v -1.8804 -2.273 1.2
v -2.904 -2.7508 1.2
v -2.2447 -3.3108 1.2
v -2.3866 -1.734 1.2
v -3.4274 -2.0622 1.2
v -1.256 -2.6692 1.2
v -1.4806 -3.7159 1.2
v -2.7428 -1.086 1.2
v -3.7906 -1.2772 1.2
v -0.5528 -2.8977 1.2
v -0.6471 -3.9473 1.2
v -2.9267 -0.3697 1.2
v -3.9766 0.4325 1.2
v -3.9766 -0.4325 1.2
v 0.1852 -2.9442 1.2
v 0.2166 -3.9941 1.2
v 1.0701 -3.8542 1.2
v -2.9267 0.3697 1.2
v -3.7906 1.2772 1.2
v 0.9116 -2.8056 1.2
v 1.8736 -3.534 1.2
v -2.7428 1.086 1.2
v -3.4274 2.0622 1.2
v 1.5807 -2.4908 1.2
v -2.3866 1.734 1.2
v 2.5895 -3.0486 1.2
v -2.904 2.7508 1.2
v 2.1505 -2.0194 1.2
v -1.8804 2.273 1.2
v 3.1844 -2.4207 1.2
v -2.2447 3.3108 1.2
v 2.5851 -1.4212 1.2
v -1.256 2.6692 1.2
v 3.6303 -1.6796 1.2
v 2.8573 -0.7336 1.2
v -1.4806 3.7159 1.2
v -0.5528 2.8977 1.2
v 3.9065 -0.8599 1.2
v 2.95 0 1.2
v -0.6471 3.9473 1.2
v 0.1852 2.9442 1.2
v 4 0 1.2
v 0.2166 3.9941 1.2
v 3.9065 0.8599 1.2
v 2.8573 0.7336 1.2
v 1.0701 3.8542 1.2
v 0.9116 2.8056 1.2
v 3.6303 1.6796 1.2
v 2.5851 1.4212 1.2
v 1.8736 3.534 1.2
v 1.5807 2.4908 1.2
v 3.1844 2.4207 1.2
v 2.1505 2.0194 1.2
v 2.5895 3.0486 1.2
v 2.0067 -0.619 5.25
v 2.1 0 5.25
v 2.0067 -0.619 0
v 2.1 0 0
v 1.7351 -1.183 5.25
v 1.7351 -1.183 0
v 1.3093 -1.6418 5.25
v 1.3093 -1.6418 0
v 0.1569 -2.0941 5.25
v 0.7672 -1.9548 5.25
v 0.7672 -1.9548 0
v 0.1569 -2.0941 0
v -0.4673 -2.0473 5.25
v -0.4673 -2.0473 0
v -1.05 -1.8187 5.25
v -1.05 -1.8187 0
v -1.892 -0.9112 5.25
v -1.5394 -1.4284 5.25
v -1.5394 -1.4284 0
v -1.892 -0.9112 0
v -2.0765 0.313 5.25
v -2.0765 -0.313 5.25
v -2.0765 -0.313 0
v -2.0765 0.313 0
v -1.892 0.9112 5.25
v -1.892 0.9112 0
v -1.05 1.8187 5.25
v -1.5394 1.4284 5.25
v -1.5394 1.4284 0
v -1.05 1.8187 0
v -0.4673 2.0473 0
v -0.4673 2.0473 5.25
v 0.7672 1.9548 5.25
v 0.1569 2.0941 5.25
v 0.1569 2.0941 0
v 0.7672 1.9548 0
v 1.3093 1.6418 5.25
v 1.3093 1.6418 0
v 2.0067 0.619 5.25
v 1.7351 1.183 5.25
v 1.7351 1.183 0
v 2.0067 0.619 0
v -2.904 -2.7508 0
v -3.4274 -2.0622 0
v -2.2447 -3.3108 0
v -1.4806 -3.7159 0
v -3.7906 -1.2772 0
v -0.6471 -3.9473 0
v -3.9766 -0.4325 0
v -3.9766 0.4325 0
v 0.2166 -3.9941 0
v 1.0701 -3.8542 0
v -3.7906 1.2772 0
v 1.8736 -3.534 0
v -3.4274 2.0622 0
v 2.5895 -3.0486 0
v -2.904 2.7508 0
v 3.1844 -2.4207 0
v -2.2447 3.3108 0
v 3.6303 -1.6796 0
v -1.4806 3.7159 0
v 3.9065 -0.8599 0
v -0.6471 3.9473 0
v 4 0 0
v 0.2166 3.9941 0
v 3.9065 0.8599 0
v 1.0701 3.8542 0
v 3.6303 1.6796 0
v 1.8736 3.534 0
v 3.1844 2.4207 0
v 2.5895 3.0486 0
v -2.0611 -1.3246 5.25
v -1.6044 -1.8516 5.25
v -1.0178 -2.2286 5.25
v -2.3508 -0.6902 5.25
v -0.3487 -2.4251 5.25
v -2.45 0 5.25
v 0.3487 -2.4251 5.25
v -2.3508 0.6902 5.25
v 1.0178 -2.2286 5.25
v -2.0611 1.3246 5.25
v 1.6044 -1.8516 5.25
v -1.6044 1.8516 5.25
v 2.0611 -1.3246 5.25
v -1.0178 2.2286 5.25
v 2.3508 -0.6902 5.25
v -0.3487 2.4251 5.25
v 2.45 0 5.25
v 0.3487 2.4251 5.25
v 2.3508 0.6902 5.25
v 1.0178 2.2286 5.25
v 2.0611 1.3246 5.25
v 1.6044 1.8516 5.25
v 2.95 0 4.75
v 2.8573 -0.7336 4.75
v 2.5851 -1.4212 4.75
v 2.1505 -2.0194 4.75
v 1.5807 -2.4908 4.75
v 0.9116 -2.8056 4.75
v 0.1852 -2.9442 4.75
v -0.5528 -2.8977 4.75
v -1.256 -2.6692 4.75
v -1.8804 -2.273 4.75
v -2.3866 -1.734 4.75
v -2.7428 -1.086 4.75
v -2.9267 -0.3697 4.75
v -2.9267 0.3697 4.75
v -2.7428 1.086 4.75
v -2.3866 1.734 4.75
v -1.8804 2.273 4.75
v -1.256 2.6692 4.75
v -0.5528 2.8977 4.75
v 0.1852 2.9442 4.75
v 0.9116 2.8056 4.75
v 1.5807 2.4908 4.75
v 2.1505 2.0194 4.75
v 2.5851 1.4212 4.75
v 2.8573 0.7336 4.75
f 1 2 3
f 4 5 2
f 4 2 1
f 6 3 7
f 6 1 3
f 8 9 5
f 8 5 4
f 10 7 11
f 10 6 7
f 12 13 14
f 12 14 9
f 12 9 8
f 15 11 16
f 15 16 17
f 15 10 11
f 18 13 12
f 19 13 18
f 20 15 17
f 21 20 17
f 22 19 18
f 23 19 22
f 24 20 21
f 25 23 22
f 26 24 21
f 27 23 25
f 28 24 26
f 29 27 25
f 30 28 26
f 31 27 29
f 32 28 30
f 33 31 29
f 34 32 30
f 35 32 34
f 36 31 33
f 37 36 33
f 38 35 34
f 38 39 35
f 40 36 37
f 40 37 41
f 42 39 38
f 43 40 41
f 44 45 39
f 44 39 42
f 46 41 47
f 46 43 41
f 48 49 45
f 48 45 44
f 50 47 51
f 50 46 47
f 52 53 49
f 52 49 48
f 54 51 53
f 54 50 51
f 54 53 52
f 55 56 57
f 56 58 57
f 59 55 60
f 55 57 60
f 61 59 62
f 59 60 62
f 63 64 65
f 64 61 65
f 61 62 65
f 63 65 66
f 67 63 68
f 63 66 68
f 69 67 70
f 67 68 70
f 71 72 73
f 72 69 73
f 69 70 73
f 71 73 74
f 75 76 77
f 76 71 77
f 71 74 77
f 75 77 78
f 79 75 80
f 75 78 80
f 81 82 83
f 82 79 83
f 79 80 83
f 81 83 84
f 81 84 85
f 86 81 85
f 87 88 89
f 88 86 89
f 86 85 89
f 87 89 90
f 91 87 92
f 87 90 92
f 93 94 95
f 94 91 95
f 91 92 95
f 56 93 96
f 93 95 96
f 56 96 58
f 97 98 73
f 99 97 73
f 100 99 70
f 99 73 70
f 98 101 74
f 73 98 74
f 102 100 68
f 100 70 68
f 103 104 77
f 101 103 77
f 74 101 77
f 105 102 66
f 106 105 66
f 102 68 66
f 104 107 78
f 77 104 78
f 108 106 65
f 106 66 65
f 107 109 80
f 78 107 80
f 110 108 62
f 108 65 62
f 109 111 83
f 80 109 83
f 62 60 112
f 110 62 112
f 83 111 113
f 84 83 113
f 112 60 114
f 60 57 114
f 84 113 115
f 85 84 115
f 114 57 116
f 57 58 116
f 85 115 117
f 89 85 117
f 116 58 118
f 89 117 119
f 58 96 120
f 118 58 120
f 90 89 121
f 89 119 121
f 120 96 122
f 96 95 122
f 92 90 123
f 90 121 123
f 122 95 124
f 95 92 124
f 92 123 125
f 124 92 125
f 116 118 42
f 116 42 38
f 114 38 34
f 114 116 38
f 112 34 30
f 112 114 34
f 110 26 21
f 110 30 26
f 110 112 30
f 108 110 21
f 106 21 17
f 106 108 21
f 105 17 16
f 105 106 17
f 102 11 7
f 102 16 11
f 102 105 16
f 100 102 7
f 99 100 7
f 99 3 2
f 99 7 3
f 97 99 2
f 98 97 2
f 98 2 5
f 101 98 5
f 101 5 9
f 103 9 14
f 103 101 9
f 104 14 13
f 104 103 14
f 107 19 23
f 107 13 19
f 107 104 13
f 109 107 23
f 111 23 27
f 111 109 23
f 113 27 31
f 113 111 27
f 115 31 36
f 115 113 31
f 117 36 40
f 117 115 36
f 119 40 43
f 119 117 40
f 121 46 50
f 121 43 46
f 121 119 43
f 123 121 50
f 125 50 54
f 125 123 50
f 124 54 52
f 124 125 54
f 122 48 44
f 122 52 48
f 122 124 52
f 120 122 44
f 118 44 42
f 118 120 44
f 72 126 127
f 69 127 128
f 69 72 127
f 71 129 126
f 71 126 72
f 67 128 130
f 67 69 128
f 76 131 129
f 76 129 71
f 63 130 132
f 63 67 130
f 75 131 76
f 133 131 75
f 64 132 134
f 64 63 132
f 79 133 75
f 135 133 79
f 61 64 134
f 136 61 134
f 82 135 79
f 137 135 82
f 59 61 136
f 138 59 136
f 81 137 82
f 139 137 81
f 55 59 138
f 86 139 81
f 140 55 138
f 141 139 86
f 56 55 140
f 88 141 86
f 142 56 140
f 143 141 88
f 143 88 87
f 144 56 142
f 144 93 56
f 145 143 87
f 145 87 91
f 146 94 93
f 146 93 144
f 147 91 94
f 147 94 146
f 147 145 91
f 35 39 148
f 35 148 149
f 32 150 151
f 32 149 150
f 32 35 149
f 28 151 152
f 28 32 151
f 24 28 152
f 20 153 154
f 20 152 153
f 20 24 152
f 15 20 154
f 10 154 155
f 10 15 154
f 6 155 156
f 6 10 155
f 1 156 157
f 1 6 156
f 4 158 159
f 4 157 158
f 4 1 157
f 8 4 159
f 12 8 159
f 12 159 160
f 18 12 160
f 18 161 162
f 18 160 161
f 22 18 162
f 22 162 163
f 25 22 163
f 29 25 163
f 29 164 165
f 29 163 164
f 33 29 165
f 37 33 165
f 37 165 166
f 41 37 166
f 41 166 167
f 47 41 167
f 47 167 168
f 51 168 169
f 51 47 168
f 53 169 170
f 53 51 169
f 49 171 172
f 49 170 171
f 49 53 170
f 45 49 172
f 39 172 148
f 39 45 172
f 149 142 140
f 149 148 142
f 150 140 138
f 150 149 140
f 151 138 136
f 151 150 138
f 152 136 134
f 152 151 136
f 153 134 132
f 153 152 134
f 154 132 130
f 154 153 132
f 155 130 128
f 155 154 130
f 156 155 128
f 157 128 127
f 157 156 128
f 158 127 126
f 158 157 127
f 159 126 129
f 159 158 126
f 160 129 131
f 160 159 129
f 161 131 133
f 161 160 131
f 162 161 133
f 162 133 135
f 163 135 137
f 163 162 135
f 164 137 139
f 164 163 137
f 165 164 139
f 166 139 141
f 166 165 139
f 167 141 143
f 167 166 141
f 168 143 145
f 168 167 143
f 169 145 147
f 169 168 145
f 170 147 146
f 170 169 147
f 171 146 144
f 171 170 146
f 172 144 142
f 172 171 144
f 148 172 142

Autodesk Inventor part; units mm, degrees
ref_plane "YZ Plane" through (0, 0, 0) normal (1, 0, 0) x (0, 1, 0)
ref_plane "XZ Plane" through (0, 0, 0) normal (0, 1, 0) x (-1, 0, 0)
ref_plane "XY Plane" through (0, 0, 0) normal (0, 0, 1) x (1, 0, 0)
sketch "Эскиз1" plane through (0, 0, 0) normal (0, 0, 1) x (1, 0, 0)
  circle A0 centre (0, 0) radius 2.95
  circle A1 centre (0, 0) radius 2.1
  circle A2 centre (0, 0) radius 4
  dimension "d0" = 5.9
  dimension "d1" = 4.2
  dimension "d2" = 8
sketch "Эскиз2" plane through (0, 0, 0) normal (0, 0, 1) x (1, 0, 0)
  circle A0 centre (0, 0) radius 2.95 projected
  circle A1 centre (0, 0) radius 2.1 projected
  circle A2 centre (0, 0) radius 4 projected
extrude "Выдавливание1" add sketch "Эскиз2" along normal blind 1.2 contours A0 | A2
sketch "Эскиз4" plane through (0, 0, 1.2) normal (0, 0, 1) x (1, 0, 0)
  circle A0 centre (0, 0) radius 2.95
  circle A1 centre (0, 0) radius 2.1 projected
  dimension "d7" = 5.9
extrude "Выдавливание3" add sketch "Эскиз4" along normal blind 4.05
chamfer "Фаска1" distance 0.5 angle 45 1 edges at (-2.95, 0, 5.25)
properties part number "middle_gear_fixator"
